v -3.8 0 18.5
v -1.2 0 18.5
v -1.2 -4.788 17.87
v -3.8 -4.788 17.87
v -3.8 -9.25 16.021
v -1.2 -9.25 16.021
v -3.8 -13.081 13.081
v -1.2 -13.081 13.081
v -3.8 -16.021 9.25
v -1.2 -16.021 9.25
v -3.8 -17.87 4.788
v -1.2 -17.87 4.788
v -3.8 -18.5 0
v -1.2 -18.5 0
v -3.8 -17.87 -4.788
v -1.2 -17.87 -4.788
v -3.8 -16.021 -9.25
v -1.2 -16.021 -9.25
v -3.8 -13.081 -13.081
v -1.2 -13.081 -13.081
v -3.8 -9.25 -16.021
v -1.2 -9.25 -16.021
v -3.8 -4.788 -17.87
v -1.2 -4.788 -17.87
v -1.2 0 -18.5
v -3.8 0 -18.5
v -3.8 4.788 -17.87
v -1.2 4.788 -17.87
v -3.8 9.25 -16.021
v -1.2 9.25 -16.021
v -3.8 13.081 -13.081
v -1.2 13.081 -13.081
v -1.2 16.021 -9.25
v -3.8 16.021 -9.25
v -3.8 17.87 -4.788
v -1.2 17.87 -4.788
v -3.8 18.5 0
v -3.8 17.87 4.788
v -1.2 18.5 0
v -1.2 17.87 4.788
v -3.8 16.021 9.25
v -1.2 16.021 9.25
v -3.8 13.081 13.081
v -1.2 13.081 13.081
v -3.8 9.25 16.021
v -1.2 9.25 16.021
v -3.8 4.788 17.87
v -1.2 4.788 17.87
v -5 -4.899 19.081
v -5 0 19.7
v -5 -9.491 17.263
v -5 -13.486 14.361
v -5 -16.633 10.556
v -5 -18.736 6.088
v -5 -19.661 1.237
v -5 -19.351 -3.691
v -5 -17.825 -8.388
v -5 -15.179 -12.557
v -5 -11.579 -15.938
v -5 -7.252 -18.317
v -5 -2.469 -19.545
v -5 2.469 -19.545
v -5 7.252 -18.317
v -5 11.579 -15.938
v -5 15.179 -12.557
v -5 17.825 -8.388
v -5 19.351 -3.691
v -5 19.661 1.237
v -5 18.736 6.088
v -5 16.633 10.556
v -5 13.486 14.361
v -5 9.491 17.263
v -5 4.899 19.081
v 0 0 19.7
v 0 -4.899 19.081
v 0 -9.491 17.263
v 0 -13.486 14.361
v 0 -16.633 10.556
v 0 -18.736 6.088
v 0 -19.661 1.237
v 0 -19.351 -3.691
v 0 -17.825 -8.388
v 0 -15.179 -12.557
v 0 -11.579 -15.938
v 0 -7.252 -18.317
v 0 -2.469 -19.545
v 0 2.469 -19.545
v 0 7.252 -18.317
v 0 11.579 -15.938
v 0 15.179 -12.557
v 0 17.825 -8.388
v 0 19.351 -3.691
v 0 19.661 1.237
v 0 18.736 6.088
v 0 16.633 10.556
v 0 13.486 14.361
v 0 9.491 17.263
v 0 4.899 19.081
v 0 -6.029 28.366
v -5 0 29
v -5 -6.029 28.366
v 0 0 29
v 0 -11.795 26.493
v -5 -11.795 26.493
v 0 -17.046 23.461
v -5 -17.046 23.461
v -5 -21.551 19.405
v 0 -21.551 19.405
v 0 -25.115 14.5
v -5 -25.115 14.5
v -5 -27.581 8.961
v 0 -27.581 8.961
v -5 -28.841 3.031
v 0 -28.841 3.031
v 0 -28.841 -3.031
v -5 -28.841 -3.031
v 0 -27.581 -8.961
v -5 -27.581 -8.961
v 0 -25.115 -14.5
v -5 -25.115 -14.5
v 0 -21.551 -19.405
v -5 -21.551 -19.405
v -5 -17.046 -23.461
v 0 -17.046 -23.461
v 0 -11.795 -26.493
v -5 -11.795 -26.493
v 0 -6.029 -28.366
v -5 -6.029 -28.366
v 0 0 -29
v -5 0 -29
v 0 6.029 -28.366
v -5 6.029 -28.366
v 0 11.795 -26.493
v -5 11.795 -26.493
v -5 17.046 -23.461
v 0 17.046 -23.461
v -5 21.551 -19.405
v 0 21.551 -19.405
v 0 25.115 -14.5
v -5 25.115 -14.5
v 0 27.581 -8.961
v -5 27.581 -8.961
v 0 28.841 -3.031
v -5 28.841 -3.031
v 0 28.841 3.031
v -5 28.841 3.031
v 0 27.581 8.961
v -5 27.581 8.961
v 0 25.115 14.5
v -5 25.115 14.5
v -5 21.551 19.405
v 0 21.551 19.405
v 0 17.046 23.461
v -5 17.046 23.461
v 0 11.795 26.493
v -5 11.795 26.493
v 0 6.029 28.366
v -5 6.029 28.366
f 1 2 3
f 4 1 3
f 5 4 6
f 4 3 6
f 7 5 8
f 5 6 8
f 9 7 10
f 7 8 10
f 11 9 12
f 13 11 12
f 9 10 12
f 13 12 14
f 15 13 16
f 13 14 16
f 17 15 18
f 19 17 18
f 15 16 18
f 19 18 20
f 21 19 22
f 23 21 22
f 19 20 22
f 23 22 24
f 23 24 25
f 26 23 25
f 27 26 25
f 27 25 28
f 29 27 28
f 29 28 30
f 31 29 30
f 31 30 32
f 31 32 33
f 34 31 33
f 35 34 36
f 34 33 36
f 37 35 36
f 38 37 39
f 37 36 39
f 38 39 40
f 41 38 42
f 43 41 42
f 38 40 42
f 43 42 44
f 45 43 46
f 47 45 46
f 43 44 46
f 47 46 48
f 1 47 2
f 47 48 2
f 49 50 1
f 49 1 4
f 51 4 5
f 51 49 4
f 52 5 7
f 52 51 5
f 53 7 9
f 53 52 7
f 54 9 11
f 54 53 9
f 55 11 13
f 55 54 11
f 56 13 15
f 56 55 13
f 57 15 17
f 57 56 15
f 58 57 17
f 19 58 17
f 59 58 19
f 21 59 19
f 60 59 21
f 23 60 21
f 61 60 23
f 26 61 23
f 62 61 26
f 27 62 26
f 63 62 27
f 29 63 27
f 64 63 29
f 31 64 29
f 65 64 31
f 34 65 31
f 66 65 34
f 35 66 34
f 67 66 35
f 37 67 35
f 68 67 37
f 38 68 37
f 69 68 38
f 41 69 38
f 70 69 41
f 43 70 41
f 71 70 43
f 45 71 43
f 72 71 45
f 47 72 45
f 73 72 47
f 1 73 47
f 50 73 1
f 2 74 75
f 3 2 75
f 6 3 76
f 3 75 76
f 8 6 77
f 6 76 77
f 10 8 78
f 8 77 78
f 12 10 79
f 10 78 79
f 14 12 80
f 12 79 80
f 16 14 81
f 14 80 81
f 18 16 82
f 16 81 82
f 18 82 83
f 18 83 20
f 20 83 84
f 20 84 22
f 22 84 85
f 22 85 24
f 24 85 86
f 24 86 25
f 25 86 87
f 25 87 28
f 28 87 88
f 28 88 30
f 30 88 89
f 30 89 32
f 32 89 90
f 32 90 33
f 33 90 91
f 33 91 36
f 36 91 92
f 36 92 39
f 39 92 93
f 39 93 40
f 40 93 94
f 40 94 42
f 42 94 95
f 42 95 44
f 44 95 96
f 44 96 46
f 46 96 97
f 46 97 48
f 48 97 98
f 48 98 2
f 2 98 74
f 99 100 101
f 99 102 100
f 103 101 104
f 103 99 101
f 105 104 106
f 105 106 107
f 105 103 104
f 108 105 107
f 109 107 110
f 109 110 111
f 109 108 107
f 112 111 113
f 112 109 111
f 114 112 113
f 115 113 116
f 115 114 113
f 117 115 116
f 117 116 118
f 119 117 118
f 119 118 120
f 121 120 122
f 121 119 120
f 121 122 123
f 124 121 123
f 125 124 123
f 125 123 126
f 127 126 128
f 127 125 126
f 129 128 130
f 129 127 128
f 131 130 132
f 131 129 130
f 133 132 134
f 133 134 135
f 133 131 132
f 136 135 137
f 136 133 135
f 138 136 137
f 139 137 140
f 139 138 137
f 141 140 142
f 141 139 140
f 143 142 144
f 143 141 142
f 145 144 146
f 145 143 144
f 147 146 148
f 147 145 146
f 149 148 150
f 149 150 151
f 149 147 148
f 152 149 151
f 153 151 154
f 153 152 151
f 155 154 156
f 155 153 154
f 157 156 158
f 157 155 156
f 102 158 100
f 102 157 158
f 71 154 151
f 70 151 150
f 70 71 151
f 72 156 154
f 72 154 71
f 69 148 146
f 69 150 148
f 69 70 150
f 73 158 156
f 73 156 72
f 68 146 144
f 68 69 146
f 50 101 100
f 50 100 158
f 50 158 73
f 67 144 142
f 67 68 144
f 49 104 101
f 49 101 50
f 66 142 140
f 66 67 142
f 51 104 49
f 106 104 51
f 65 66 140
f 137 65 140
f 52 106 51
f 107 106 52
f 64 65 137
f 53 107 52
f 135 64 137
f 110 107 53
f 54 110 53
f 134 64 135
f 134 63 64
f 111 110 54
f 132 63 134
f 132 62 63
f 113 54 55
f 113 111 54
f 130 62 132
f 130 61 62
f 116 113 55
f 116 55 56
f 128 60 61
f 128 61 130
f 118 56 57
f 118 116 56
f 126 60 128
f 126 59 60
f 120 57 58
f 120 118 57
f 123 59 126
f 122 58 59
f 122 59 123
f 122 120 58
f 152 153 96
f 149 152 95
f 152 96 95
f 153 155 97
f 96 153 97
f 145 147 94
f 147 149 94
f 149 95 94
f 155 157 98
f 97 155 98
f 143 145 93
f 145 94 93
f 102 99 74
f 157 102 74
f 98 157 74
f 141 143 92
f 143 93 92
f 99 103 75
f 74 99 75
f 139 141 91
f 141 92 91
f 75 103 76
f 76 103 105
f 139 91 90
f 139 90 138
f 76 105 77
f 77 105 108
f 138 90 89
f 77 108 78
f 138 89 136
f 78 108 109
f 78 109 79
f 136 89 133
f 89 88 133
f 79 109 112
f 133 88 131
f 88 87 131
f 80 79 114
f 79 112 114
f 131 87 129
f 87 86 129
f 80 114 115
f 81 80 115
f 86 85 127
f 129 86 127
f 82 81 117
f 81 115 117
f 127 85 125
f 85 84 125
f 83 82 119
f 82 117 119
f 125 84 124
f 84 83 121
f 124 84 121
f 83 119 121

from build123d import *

# Parameters (mm, degrees)
SKETCH1_W         = 5
SKETCH1_H         = 10.5
IDCHAMFER_SIZE    = 1.2
IDCHAMFERFAR_SIZE = 1.2


with BuildPart() as part:
    # Sketch1 → Base-Revolve (revolve)
    with BuildSketch(Plane.XY, mode=Mode.PRIVATE) as base_revolve_sk:
        with Locations((-2.5, 23.75)):
            Rectangle(SKETCH1_W, SKETCH1_H)
    revolve(base_revolve_sk.sketch.rotate(Axis((-34.925, 0, 0), (1, 0, 0)), 90), axis=Axis((-34.925, 0, 0), (1, 0, 0)))

    # IDChamfer
    idchamfer_edges = [part.edges().sort_by_distance(p)[0] for p in [
        (0, 0, -18.5),
    ]]
    chamfer(idchamfer_edges, length=IDCHAMFER_SIZE)

    # IDChamferFar
    idchamferfar_edges = [part.edges().sort_by_distance(p)[0] for p in [
        (-5, 0, -18.5),
    ]]
    chamfer(idchamferfar_edges, length=IDCHAMFERFAR_SIZE)


solid = part.part
